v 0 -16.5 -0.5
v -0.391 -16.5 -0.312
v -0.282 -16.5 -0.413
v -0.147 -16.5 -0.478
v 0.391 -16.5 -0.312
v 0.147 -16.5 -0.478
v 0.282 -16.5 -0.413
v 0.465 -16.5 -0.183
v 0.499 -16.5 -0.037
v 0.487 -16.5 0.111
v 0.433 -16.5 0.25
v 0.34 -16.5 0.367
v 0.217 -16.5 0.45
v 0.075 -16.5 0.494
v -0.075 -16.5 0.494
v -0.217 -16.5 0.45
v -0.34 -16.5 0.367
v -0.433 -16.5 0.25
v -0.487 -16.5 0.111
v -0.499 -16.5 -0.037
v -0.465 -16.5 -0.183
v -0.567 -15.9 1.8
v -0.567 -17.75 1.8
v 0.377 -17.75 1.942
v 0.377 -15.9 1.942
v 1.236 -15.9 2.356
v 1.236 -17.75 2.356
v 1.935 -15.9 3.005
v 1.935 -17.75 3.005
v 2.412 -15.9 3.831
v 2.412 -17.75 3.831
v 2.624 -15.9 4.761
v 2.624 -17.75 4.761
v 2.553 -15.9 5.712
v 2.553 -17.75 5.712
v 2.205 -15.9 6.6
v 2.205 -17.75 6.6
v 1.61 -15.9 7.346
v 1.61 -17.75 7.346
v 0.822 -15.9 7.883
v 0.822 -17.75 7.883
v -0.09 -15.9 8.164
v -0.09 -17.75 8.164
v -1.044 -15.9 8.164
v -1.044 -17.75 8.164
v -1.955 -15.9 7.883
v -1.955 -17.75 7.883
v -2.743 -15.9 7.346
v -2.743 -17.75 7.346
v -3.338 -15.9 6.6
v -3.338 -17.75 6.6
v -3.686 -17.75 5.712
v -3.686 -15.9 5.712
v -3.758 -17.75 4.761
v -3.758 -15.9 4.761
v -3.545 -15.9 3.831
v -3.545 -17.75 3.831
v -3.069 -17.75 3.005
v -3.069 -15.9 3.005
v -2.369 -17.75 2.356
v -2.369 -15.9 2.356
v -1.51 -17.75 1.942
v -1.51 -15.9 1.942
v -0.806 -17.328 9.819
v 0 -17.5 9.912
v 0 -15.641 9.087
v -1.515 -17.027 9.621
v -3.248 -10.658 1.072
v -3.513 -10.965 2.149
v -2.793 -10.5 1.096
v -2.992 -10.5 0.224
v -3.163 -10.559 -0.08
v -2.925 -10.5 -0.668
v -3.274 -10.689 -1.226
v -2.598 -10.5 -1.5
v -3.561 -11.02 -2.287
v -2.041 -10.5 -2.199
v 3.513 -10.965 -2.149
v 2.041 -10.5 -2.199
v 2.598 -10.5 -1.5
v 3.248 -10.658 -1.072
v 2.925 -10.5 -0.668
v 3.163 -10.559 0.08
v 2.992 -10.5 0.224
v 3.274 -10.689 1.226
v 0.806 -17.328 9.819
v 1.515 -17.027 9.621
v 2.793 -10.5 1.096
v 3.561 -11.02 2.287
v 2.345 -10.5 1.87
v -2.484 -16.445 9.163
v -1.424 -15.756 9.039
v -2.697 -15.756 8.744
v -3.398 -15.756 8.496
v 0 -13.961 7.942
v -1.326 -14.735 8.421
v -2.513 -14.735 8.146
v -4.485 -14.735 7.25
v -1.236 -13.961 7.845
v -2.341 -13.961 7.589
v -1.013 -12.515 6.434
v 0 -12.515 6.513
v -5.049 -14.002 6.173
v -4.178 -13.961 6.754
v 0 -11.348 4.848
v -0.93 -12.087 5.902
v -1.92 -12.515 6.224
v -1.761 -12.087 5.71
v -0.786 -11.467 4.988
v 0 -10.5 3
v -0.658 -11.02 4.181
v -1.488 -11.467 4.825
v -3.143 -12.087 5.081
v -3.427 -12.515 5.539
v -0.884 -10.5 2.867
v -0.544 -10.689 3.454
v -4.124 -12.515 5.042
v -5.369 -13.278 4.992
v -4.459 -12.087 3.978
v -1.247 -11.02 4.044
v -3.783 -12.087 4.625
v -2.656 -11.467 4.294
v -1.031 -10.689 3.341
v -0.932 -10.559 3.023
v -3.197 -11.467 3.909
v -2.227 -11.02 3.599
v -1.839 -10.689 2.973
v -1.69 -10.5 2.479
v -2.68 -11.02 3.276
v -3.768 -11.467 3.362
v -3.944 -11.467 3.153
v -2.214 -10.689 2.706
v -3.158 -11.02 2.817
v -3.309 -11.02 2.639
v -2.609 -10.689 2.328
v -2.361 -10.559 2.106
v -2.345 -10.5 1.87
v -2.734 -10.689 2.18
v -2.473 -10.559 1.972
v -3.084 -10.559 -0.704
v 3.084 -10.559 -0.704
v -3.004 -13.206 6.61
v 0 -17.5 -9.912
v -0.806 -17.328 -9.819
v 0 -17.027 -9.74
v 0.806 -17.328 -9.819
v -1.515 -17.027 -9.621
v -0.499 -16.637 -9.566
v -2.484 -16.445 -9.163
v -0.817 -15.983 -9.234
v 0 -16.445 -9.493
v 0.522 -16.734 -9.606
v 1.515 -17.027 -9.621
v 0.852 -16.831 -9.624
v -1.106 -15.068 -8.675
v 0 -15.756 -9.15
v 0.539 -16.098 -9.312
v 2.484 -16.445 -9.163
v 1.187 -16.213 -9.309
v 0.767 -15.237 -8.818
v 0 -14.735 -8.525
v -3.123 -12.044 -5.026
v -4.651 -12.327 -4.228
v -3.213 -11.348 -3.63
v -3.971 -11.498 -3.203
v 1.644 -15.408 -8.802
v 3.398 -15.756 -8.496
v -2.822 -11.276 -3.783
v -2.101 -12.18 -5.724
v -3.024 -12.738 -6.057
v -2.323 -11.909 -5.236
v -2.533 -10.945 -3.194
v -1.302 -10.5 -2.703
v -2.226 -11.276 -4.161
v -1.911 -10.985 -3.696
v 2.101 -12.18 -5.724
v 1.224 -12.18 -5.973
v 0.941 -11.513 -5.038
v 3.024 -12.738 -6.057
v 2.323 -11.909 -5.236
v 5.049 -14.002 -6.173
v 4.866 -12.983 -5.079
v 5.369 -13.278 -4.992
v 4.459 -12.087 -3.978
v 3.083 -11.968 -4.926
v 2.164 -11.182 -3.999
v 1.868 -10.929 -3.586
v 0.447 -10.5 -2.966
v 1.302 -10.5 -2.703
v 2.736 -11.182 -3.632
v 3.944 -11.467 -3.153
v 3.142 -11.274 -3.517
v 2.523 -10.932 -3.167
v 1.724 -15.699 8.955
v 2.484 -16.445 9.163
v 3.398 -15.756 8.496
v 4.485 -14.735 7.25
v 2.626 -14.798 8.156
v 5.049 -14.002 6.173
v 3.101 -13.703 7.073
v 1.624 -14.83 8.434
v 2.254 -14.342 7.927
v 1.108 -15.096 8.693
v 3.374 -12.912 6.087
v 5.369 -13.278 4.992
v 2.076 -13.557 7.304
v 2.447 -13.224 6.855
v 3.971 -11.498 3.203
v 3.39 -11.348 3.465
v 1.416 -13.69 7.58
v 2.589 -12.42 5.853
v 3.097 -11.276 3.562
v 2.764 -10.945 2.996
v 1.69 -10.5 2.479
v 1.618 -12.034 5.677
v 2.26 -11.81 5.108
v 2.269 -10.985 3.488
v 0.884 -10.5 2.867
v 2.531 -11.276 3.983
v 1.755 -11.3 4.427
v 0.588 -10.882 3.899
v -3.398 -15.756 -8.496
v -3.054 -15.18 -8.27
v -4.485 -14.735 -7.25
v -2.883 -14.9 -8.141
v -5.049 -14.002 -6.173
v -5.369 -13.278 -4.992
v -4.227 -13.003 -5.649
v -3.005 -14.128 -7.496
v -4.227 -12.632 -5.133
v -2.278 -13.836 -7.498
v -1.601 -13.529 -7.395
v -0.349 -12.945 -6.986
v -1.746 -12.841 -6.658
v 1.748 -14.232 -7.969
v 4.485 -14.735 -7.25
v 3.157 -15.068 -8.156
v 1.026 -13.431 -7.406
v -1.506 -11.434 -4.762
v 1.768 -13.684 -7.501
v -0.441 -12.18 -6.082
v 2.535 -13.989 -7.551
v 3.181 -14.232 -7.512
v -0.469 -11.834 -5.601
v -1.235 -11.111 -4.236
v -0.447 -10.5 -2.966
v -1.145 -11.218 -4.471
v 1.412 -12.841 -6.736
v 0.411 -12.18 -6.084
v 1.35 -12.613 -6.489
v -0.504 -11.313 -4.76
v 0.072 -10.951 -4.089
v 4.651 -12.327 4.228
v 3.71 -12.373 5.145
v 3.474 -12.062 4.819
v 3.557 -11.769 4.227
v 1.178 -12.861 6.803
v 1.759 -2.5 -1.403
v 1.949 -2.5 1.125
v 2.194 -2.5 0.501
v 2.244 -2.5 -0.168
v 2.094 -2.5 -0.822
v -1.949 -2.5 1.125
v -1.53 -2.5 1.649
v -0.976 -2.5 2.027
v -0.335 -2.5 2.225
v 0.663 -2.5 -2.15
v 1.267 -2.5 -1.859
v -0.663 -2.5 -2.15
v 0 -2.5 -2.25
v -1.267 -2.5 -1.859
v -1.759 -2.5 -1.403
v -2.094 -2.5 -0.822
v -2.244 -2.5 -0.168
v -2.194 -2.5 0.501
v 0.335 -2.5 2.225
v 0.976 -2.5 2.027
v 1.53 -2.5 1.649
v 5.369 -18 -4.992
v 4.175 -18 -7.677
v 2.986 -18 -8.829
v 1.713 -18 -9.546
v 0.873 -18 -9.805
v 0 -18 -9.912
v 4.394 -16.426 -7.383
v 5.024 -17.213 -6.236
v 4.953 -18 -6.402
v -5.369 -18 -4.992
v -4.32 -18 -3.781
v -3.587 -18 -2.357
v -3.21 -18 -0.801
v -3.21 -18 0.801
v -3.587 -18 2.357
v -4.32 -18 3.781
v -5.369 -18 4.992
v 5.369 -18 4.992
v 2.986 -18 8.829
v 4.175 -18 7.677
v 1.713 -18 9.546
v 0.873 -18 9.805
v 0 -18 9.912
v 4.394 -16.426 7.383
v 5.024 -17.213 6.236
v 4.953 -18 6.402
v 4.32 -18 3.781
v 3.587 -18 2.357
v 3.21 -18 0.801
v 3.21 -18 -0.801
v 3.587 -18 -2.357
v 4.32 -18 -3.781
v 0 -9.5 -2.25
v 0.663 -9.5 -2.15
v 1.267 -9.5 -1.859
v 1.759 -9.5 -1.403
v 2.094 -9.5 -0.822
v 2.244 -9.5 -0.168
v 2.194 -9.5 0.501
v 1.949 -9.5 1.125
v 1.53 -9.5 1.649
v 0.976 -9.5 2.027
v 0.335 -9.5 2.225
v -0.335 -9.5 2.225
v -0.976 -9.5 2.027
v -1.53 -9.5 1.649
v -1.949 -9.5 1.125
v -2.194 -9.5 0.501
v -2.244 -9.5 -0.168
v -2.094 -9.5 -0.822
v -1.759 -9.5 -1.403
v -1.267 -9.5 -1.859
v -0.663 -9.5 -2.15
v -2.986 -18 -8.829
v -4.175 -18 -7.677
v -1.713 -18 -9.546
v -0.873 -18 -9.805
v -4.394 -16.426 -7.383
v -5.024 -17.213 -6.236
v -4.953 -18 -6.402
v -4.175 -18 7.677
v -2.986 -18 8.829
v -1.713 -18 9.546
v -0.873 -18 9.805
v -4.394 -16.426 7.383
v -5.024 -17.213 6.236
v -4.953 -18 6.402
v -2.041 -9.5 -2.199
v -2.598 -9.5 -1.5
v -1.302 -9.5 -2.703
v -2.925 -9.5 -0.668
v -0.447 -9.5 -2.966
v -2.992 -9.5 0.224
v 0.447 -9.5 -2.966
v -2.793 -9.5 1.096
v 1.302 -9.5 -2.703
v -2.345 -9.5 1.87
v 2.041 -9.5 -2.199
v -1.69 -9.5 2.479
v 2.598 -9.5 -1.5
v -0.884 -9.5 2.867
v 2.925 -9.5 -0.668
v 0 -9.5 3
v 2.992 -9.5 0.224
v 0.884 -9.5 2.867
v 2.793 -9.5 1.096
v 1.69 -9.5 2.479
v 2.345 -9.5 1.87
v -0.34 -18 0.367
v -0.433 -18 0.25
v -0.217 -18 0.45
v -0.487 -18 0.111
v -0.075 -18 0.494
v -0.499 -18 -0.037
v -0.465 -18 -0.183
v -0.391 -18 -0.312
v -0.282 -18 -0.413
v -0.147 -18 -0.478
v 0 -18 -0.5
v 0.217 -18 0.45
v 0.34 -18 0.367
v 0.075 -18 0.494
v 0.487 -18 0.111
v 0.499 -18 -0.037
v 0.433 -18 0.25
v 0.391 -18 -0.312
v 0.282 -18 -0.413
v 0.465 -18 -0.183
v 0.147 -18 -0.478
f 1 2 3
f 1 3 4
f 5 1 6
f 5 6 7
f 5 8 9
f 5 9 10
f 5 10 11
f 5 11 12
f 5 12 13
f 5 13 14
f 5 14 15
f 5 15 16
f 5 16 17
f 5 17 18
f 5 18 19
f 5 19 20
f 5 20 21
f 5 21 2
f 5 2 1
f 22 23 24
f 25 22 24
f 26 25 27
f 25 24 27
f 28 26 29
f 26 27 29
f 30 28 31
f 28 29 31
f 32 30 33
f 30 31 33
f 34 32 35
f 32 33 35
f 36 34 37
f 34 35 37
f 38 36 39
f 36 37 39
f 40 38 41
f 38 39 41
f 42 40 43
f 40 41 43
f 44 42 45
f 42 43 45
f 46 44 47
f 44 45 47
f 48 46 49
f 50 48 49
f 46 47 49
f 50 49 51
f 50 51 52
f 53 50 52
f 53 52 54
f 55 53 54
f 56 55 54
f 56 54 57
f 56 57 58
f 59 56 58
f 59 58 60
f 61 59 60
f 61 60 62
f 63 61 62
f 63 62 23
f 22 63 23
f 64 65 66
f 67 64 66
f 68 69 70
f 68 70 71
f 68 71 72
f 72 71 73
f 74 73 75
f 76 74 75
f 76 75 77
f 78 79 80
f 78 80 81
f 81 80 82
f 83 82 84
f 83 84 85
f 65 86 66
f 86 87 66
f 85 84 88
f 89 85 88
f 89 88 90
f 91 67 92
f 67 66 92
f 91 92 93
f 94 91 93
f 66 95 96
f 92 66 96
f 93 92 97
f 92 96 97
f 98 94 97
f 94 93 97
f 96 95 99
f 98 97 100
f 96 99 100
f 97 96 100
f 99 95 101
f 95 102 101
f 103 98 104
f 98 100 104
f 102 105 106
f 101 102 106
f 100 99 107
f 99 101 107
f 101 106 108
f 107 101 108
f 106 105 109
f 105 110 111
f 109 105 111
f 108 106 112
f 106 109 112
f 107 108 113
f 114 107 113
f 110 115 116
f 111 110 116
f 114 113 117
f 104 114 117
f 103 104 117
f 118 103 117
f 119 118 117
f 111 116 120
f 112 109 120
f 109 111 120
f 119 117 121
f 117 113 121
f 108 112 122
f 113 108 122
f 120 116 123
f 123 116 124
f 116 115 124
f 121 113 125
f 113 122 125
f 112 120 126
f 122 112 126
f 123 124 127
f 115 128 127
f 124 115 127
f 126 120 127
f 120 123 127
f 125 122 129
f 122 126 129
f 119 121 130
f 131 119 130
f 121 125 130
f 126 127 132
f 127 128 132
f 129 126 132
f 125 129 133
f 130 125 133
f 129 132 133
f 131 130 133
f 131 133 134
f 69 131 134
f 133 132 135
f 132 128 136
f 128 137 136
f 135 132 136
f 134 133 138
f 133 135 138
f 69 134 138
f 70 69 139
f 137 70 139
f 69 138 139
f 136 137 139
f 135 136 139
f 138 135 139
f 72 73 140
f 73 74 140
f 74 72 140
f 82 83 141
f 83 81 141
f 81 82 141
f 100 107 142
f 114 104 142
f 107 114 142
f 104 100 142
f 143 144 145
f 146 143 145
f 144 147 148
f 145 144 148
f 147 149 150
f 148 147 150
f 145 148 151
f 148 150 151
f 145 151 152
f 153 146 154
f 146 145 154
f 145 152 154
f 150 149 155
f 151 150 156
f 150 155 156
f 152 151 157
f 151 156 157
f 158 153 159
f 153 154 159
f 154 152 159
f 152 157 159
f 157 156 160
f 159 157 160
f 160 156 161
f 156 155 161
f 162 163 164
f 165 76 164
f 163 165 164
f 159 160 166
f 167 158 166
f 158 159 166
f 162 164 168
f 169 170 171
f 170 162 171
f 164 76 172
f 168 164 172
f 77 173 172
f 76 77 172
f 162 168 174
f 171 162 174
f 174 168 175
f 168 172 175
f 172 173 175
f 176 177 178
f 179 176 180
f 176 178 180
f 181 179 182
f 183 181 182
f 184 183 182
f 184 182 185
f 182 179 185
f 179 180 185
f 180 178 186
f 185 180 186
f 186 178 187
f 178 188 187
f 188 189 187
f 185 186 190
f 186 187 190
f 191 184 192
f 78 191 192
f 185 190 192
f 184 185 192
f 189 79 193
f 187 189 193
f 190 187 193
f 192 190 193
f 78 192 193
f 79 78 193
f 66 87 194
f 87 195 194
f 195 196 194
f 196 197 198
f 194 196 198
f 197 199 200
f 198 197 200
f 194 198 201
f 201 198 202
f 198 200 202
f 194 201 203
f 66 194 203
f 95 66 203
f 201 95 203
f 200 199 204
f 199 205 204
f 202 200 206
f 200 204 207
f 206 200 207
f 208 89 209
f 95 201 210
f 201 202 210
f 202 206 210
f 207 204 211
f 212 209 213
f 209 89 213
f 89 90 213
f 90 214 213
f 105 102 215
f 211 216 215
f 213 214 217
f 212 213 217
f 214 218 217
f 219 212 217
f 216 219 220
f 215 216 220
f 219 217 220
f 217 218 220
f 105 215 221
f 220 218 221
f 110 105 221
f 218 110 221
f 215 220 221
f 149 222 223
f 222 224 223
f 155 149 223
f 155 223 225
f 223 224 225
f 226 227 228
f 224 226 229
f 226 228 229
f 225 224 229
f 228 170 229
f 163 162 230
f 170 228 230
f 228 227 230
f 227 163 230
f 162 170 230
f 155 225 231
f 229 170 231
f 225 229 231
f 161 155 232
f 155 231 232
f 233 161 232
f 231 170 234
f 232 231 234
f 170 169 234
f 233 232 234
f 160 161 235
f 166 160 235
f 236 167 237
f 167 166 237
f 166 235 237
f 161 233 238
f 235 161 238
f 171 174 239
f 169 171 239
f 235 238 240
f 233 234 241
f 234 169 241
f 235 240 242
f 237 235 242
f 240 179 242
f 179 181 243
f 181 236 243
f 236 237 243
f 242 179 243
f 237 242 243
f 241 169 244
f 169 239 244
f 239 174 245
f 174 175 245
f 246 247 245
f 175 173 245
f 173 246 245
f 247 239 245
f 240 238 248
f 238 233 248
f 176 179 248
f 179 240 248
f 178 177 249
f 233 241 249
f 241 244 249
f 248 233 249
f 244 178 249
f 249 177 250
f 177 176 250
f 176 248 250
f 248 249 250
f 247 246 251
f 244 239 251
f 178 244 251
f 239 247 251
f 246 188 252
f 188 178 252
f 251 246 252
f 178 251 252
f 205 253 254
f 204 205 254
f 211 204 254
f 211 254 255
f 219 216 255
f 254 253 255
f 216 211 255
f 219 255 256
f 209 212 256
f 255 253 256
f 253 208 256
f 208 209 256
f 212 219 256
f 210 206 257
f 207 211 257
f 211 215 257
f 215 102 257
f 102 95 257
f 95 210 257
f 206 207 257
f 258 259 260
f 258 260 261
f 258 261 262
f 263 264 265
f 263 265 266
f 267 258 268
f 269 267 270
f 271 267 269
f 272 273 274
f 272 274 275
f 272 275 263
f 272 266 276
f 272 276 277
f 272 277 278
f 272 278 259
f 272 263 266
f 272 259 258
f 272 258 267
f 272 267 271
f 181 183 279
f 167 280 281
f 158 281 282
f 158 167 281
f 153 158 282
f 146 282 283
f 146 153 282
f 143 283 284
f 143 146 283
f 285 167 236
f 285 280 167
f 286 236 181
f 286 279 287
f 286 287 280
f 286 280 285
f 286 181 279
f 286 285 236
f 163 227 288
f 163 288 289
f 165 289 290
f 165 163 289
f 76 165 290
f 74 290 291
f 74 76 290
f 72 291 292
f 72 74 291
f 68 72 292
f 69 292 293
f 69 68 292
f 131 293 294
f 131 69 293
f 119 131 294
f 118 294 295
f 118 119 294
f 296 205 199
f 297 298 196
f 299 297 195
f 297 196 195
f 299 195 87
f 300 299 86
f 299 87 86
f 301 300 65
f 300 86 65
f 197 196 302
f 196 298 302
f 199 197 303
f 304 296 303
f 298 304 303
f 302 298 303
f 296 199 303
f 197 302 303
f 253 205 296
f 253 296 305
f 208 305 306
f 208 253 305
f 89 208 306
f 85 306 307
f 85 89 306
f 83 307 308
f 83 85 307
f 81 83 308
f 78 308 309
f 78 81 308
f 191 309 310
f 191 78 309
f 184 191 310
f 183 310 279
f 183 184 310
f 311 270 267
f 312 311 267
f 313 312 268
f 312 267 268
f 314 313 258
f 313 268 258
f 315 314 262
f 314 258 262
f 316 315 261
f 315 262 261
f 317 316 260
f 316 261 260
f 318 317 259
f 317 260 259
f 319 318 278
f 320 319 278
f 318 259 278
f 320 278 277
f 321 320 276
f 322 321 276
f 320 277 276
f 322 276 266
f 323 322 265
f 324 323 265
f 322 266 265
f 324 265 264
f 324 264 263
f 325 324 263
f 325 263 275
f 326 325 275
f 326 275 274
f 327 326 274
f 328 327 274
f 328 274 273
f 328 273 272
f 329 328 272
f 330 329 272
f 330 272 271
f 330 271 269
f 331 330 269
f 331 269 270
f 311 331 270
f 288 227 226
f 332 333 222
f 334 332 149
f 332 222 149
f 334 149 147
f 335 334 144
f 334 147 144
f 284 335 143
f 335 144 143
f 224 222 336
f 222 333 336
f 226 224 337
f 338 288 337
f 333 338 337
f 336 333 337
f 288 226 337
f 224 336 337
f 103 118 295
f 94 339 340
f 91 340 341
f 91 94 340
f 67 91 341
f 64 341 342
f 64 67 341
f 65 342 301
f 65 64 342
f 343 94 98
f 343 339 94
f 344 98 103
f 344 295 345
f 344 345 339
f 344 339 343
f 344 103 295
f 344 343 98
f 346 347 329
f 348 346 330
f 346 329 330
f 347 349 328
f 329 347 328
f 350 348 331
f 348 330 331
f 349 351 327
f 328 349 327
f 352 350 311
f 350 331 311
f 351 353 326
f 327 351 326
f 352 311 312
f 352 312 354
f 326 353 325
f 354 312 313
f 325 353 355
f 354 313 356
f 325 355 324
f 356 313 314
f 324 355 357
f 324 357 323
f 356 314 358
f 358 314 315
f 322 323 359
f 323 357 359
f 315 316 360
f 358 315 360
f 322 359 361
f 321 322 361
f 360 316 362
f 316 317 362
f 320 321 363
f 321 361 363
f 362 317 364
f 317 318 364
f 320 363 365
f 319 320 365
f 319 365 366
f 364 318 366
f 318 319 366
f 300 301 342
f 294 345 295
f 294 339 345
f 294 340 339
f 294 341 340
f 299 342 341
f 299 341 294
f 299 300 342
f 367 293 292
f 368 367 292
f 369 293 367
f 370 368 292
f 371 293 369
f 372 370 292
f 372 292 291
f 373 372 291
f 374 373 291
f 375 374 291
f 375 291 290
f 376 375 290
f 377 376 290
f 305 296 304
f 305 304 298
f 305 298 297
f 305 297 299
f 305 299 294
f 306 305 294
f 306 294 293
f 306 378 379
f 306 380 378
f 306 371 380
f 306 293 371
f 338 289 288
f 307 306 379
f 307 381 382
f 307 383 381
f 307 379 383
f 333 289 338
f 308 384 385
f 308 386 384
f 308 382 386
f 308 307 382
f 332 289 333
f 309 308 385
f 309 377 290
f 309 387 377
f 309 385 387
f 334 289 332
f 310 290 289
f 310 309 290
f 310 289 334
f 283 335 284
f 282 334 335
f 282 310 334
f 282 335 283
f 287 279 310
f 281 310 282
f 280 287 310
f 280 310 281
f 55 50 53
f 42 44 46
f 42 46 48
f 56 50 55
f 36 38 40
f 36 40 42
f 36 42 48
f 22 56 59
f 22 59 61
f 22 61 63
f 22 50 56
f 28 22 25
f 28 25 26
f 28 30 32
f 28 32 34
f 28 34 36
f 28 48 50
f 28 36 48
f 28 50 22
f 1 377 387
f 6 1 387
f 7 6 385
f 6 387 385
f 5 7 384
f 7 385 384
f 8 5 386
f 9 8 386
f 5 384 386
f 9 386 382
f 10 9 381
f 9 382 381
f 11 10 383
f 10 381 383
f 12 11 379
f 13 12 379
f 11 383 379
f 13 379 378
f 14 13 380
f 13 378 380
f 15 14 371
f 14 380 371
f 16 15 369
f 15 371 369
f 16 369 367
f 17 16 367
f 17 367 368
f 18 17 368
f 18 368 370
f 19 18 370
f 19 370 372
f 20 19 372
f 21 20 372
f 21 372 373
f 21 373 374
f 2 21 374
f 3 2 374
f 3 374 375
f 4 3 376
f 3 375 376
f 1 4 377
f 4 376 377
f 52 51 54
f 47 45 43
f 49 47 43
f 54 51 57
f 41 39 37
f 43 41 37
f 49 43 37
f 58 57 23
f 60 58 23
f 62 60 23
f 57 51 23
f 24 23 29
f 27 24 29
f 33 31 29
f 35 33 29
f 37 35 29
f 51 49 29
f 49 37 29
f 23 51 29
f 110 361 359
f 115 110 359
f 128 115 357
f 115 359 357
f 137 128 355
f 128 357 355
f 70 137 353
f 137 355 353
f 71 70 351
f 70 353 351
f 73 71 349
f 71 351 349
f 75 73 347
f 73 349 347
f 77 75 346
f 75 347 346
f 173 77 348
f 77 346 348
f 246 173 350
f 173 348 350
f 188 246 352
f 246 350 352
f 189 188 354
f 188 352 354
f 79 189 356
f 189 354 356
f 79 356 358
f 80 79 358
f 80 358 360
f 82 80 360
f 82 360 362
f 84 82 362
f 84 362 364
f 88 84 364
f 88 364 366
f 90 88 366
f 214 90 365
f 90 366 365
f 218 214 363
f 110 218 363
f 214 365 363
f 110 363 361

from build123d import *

# Parameters (mm, degrees)
SKETCH1_R           = 5
SKETCH1_R_2         = 3
BOSS_EXTRUDE2_DEPTH = 17.5
SKETCH4_W           = 18
SKETCH4_H           = 1
EXTRUDE_THIN1_DEPTH = 35
CIRPATTERN1_COUNT   = 9
SKETCH5_R           = 3
BOSS_EXTRUDE3_DEPTH = 15
SKETCH6_R           = 3.5
SKETCH6_R_2         = 1.5
CUT_EXTRUDE1_DEPTH  = 6
SKETCH15_R          = 1.5
CUT_EXTRUDE2_DEPTH  = 2
SKETCH17_R          = 2.5
BOSS_EXTRUDE4_DEPTH = 3
SKETCH18_R          = 2
CUT_EXTRUDE3_DEPTH  = 2
SKETCH19_R          = 4
CUT_EXTRUDE4_DEPTH  = 20
SKETCH20_W          = 45.677284088
SKETCH20_H          = 45.724664858
CUT_EXTRUDE5_DEPTH  = 8
SKETCH21_R          = 3
BOSS_EXTRUDE5_DEPTH = 1
SKETCH24_R          = 9.912143672
BOSS_EXTRUDE6_DEPTH = 0.5
SKETCH25_R          = 3.2
CUT_EXTRUDE6_DEPTH  = 2.1
SKETCH26_R          = 3.2
BOSS_EXTRUDE7_DEPTH = 0.25
CUT_EXTRUDE8_START  = -7.5
CUT_EXTRUDE8_DEPTH  = 7.5
SKETCH28_R          = 0.5
CUT_EXTRUDE9_DEPTH  = 1.5
CUT_EXTRUDE10_DEPTH = 7
BOSS_EXTRUDE8_START = 10
SKETCH30_R          = 4
BOSS_EXTRUDE8_DEPTH = 10
CUT_EXTRUDE12_START = -20
SKETCH31_R          = 2.25
CUT_EXTRUDE12_DEPTH = 20
SKETCH32_R          = 2.25
CUT_EXTRUDE13_DEPTH = 10


with BuildPart() as part:
    # Sketch1 → Boss-Extrude2 (new, symmetric)
    with BuildSketch(Plane(origin=(0, 0, 0), x_dir=(1, 0, 0), z_dir=(0, 1, 0))):
        with Locations(Location((0, 0, 0), (0, 0, 270))):
            Circle(SKETCH1_R)
        with Locations(Location((0, 0, 0), (0, 0, 270))):
            Circle(SKETCH1_R_2, mode=Mode.SUBTRACT)
    extrude(amount=BOSS_EXTRUDE2_DEPTH, both=True)

    # Sketch4 → Extrude-Thin1 (add)
    with BuildSketch(Plane(origin=(0, 17.5, 0), x_dir=(1, 0, 0), z_dir=(0, 1, 0))):
        with Locations((12, 0)):
            Rectangle(SKETCH4_W, SKETCH4_H)
    extrude_thin1 = extrude(amount=-EXTRUDE_THIN1_DEPTH)

    # CirPattern1: Extrude-Thin1 ×9 about axis
    cirpattern1_axis = Axis((0, 0, 0), (0, 1, 0))
    for i in range(1, CIRPATTERN1_COUNT):
        add(extrude_thin1.rotate(cirpattern1_axis, i * 360 / CIRPATTERN1_COUNT))

    # Sketch5 → Boss-Extrude3 (add)
    with BuildSketch(Plane(origin=(0, -17.5, 0), x_dir=(-1, 0, 0), z_dir=(0, -1, 0))):
        with Locations(Location((0, 0, 0), (0, 0, 90))):
            Circle(SKETCH5_R)
    extrude(amount=-BOSS_EXTRUDE3_DEPTH)

    # Sketch6 → Cut-Extrude1 (cut)
    with BuildSketch(Plane(origin=(0, -17.5, 0), x_dir=(-1, 0, 0), z_dir=(0, -1, 0))):
        with Locations(Location((0, 0, 0), (0, 0, 90))):
            Circle(SKETCH6_R)
        with Locations(Location((0, 0, 0), (0, 0, 90))):
            Circle(SKETCH6_R_2, mode=Mode.SUBTRACT)
    extrude(amount=-CUT_EXTRUDE1_DEPTH, mode=Mode.SUBTRACT)

    # Sketch15 → Cut-Extrude2 (cut)
    with BuildSketch(Plane.XZ.offset(17.5)):
        with Locations(Location((0, 0, 0), (0, 0, 270))):
            Circle(SKETCH15_R)
    extrude(amount=-CUT_EXTRUDE2_DEPTH, mode=Mode.SUBTRACT)

    # Sketch17 → Boss-Extrude4 (add)
    with BuildSketch(Plane.XZ.offset(17.5)):
        with Locations((18.5, 0)):
            Circle(SKETCH17_R)
    extrude(amount=-BOSS_EXTRUDE4_DEPTH)

    # Sketch18 → Cut-Extrude3 (cut)
    with BuildSketch(Plane.XZ.offset(17.5)):
        with Locations(Location((18.5, 0, 0), (0, 0, 270))):
            Circle(SKETCH18_R)
    extrude(amount=-CUT_EXTRUDE3_DEPTH, mode=Mode.SUBTRACT)

    # Sketch19 → Cut-Extrude4 (cut)
    with BuildSketch(Plane(origin=(0, 17.5, 0), x_dir=(1, 0, 0), z_dir=(0, 1, 0))):
        with Locations(Location((0, 0, 0), (0, 0, 270))):
            Circle(SKETCH19_R)
    extrude(amount=-CUT_EXTRUDE4_DEPTH, mode=Mode.SUBTRACT)

    # Sketch20 → Cut-Extrude5 (cut)
    with BuildSketch(Plane(origin=(0, -17.5, 0), x_dir=(-1, 0, 0), z_dir=(0, -1, 0))):
        Rectangle(SKETCH20_W, SKETCH20_H)
    extrude(amount=-CUT_EXTRUDE5_DEPTH, mode=Mode.SUBTRACT)

    # Sketch21 → Boss-Extrude5 (add)
    with BuildSketch(Plane.XZ.offset(9.5)):
        with Locations(Location((0, 0, 0), (0, 0, 90))):
            Circle(SKETCH21_R)
    extrude(amount=BOSS_EXTRUDE5_DEPTH)

    # Sketch23 → Revolve1 (revolve)
    with BuildSketch(Plane(origin=(0, 0, 0), x_dir=(0, 0, -1), z_dir=(1, 0, 0))):
        with BuildLine():
            Line((-3, -10.5), (-2, -10.5))
            Line((-2, -10.5), (0, -10.5))
            Line((0, -10.5), (0, -17.5))
            Line((0, -17.5), (-8.912143672, -17.5))
            Line((-8.912143672, -17.5), (-9.912143672, -17.5))
            ThreePointArc((-9.912143672, -17.5), (-7.260403323, -13.2057636), (-3, -10.5))
        make_face()
    revolve(axis=Axis((0, -11.130650603, 0), (0, -1, 0)))

    # Sketch24 → Boss-Extrude6 (add)
    with BuildSketch(Plane.XZ.offset(17.5)):
        with Locations(Location((0, 0, 0), (0, 0, 270))):
            Circle(SKETCH24_R)
    extrude(amount=BOSS_EXTRUDE6_DEPTH)

    # Sketch25 → Cut-Extrude6 (cut)
    with BuildSketch(Plane.XZ.offset(18)):
        with Locations(Location((-0.56668442, 5, 0), (0, 0, 270))):
            Circle(SKETCH25_R)
    extrude(amount=-CUT_EXTRUDE6_DEPTH, mode=Mode.SUBTRACT)

    # Sketch26 → Boss-Extrude7 (add)
    with BuildSketch(Plane.XZ.offset(18)):
        with Locations(Location((-0.56668442, 5, 0), (0, 0, 270))):
            Circle(SKETCH26_R)
    extrude(amount=-BOSS_EXTRUDE7_DEPTH)

    # Sketch27 → Cut-Extrude8 (cut)
    with BuildSketch(Plane.XZ.offset(18).offset(CUT_EXTRUDE8_START)):
        with BuildLine():
            ThreePointArc((-5.368630905, 4.991892601), (-6.424807204, 5.779358473), (-7.613826501, 6.346671425))
            ThreePointArc((-7.613826501, 6.346671425), (-9.912143672, 0), (-7.613826501, -6.346671425))
            ThreePointArc((-7.613826501, -6.346671425), (-6.424807204, -5.779358473), (-5.368630905, -4.991892601))
            ThreePointArc((-5.368630905, -4.991892601), (-3.162143672, 0), (-5.368630905, 4.991892601))
        make_face()
        with BuildLine():
            ThreePointArc((9.912143672, 0), (9.319869483, 3.375), (7.613826501, 6.346671425))
            ThreePointArc((7.613826501, 6.346671425), (6.424807204, 5.779358473), (5.368630905, 4.991892601))
            ThreePointArc((5.368630905, 4.991892601), (3.162143672, 0), (5.368630905, -4.991892601))
            ThreePointArc((5.368630905, -4.991892601), (6.424807204, -5.779358473), (7.613826501, -6.346671425))
            ThreePointArc((7.613826501, -6.346671425), (9.319869483, -3.375), (9.912143672, 0))
        make_face()
        with BuildLine():
            ThreePointArc((-5.368630905, -4.991892601), (-6.424807204, -5.779358473), (-7.613826501, -6.346671425))
            ThreePointArc((-7.613826501, -6.346671425), (-4.203657524, -8.976628297), (0, -9.912143672))
            add(Edge.make_bspline(
                [(-5.368630905, -4.991892601), (-4.998119196, -7.539682857), (-2.616364035, -9.837937814), (0, -9.912143672)],
                knots=[0, 0, 0, 0, 1, 1, 1, 1], degree=3))
        make_face()
        with BuildLine():
            add(Edge.make_bspline(
                [(5.368630905, -4.991892601), (4.998119196, -7.539682857), (2.616364035, -9.837937814), (0, -9.912143672)],
                knots=[0, 0, 0, 0, 1, 1, 1, 1], degree=3))
            ThreePointArc((0, -9.912143672), (4.203657524, -8.976628297), (7.613826501, -6.346671425))
            ThreePointArc((7.613826501, -6.346671425), (6.424807204, -5.779358473), (5.368630905, -4.991892601))
        make_face()
        with BuildLine():
            ThreePointArc((0, 9.912143672), (-4.203657524, 8.976628297), (-7.613826501, 6.346671425))
            ThreePointArc((-7.613826501, 6.346671425), (-6.424807204, 5.779358473), (-5.368630905, 4.991892601))
            add(Edge.make_bspline(
                [(-5.368630905, 4.991892601), (-4.998119196, 7.539682857), (-2.616364035, 9.837937814), (0, 9.912143672)],
                knots=[0, 0, 0, 0, 1, 1, 1, 1], degree=3))
        make_face()
        with BuildLine():
            ThreePointArc((7.613826501, 6.346671425), (4.203657524, 8.976628297), (0, 9.912143672))
            add(Edge.make_bspline(
                [(5.368630905, 4.991892601), (4.998119196, 7.539682857), (2.616364035, 9.837937814), (0, 9.912143672)],
                knots=[0, 0, 0, 0, 1, 1, 1, 1], degree=3))
            ThreePointArc((5.368630905, 4.991892601), (6.424807204, 5.779358473), (7.613826501, 6.346671425))
        make_face()
    extrude(amount=CUT_EXTRUDE8_DEPTH, mode=Mode.SUBTRACT)

    # Sketch28 → Cut-Extrude9 (cut)
    with BuildSketch(Plane.XZ.offset(18)):
        with Locations(Location((0, 0, 0), (0, 0, 270))):
            Circle(SKETCH28_R)
    extrude(amount=-CUT_EXTRUDE9_DEPTH, mode=Mode.SUBTRACT)

    # Sketch29 → Cut-Extrude10 (cut)
    with BuildSketch(Plane(origin=(0, 17.5, 0), x_dir=(1, 0, 0), z_dir=(0, 1, 0))):
        with BuildLine():
            Line((3.489629181, -3.580850203), (15.765539501, -13.881562025))
            Line((15.765539501, -13.881562025), (16.40832711, -13.115517582))
            Line((16.40832711, -13.115517582), (4.132416791, -2.81480576))
            ThreePointArc((4.132416791, -2.81480576), (4.698463104, -1.710100717), (4.974937186, -0.5))
            Line((4.974937186, -0.5), (21, -0.5))
            Line((21, -0.5), (21, 0.5))
            Line((21, 0.5), (4.974937186, 0.5))
            ThreePointArc((4.974937186, 0.5), (4.698463104, 1.710100717), (4.132416791, 2.81480576))
            Line((4.132416791, 2.81480576), (16.40832711, 13.115517582))
            Line((16.40832711, 13.115517582), (15.765539501, 13.881562025))
            Line((15.765539501, 13.881562025), (3.489629181, 3.580850203))
            ThreePointArc((3.489629181, 3.580850203), (2.5, 4.330127019), (1.356292653, 4.812532622))
            Line((1.356292653, 4.812532622), (4.139015608, 20.594138724))
            Line((4.139015608, 20.594138724), (3.154207854, 20.767786902))
            Line((3.154207854, 20.767786902), (0.3714849, 4.9861808))
            ThreePointArc((0.3714849, 4.9861808), (-0.868240888, 4.924038765), (-2.054455891, 4.558421985))
            Line((-2.054455891, 4.558421985), (-10.066987298, 18.436533479))
            Line((-10.066987298, 18.436533479), (-10.933012702, 17.936533479))
            Line((-10.933012702, 17.936533479), (-2.920481295, 4.058421985))
            ThreePointArc((-2.920481295, 4.058421985), (-3.830222216, 3.213938048), (-4.50390169, 2.17137504))
            Line((-4.50390169, 2.17137504), (-19.562534965, 7.65226932))
            Line((-19.562534965, 7.65226932), (-19.904555108, 6.712576699))
            Line((-19.904555108, 6.712576699), (-4.845921834, 1.231682419))
            ThreePointArc((-4.845921834, 1.231682419), (-5, 0), (-4.845921834, -1.231682419))
            Line((-4.845921834, -1.231682419), (-19.904555108, -6.712576699))
            Line((-19.904555108, -6.712576699), (-19.562534965, -7.65226932))
            Line((-19.562534965, -7.65226932), (-4.50390169, -2.17137504))
            ThreePointArc((-4.50390169, -2.17137504), (-3.830222216, -3.213938048), (-2.920481295, -4.058421985))
            Line((-2.920481295, -4.058421985), (-10.933012702, -17.936533479))
            Line((-10.933012702, -17.936533479), (-10.066987298, -18.436533479))
            Line((-10.066987298, -18.436533479), (-2.054455891, -4.558421985))
            ThreePointArc((-2.054455891, -4.558421985), (-0.868240888, -4.924038765), (0.3714849, -4.9861808))
            Line((0.3714849, -4.9861808), (3.154207854, -20.767786902))
            Line((3.154207854, -20.767786902), (4.139015608, -20.594138724))
            Line((4.139015608, -20.594138724), (1.356292653, -4.812532622))
            ThreePointArc((1.356292653, -4.812532622), (2.5, -4.330127019), (3.489629181, -3.580850203))
        make_face()
    extrude(amount=-CUT_EXTRUDE10_DEPTH, mode=Mode.SUBTRACT)

    # Sketch30 → Boss-Extrude8 (add)
    with BuildSketch(Plane(origin=(0, -2.5, 0), x_dir=(1, 0, 0), z_dir=(0, 1, 0)).offset(BOSS_EXTRUDE8_START)):
        with Locations(Location((0, 0, 0), (0, 0, 270))):
            Circle(SKETCH30_R)
    extrude(amount=-BOSS_EXTRUDE8_DEPTH)

    # Sketch31 → Cut-Extrude12 (cut)
    with BuildSketch(Plane.XZ.offset(9.5).offset(CUT_EXTRUDE12_START)):
        with BuildLine():
            Line((-2.054455891, 4.558421985), (-10.066987298, 18.436533479))
            Line((-10.066987298, 18.436533479), (-10.933012702, 17.936533479))
            Line((-10.933012702, 17.936533479), (-2.920481295, 4.058421985))
            ThreePointArc((-2.920481295, 4.058421985), (-3.830222216, 3.213938048), (-4.50390169, 2.17137504))
            Line((-4.50390169, 2.17137504), (-19.562534965, 7.65226932))
            Line((-19.562534965, 7.65226932), (-19.904555108, 6.712576699))
            Line((-19.904555108, 6.712576699), (-4.845921834, 1.231682419))
            ThreePointArc((-4.845921834, 1.231682419), (-5, 0), (-4.845921834, -1.231682419))
            Line((-4.845921834, -1.231682419), (-19.904555108, -6.712576699))
            Line((-19.904555108, -6.712576699), (-19.562534965, -7.65226932))
            Line((-19.562534965, -7.65226932), (-4.50390169, -2.17137504))
            ThreePointArc((-4.50390169, -2.17137504), (-3.830222216, -3.213938048), (-2.920481295, -4.058421985))
            Line((-2.920481295, -4.058421985), (-10.933012702, -17.936533479))
            Line((-10.933012702, -17.936533479), (-10.066987298, -18.436533479))
            Line((-10.066987298, -18.436533479), (-2.054455891, -4.558421985))
            ThreePointArc((-2.054455891, -4.558421985), (-0.868240888, -4.924038765), (0.3714849, -4.9861808))
            Line((0.3714849, -4.9861808), (3.154207854, -20.767786902))
            Line((3.154207854, -20.767786902), (4.139015608, -20.594138724))
            Line((4.139015608, -20.594138724), (1.356292653, -4.812532622))
            ThreePointArc((1.356292653, -4.812532622), (2.5, -4.330127019), (3.489629181, -3.580850203))
            Line((3.489629181, -3.580850203), (15.765539501, -13.881562025))
            Line((15.765539501, -13.881562025), (16.40832711, -13.115517582))
            Line((16.40832711, -13.115517582), (4.132416791, -2.81480576))
            ThreePointArc((4.132416791, -2.81480576), (4.698463104, -1.710100717), (4.974937186, -0.5))
            Line((4.974937186, -0.5), (21, -0.5))
            Line((21, -0.5), (21, 0.5))
            Line((21, 0.5), (4.974937186, 0.5))
            ThreePointArc((4.974937186, 0.5), (4.698463104, 1.710100717), (4.132416791, 2.81480576))
            Line((4.132416791, 2.81480576), (16.40832711, 13.115517582))
            Line((16.40832711, 13.115517582), (15.765539501, 13.881562025))
            Line((15.765539501, 13.881562025), (3.489629181, 3.580850203))
            ThreePointArc((3.489629181, 3.580850203), (2.5, 4.330127019), (1.356292653, 4.812532622))
            Line((1.356292653, 4.812532622), (4.139015608, 20.594138724))
            Line((4.139015608, 20.594138724), (3.154207854, 20.767786902))
            Line((3.154207854, 20.767786902), (0.3714849, 4.9861808))
            ThreePointArc((0.3714849, 4.9861808), (-0.868240888, 4.924038765), (-2.054455891, 4.558421985))
        make_face()
        with Locations(Location((0, 0, 0), (0, 0, 270))):
            Circle(SKETCH31_R, mode=Mode.SUBTRACT)
    extrude(amount=CUT_EXTRUDE12_DEPTH, mode=Mode.SUBTRACT)

    # Sketch32 → Cut-Extrude13 (cut)
    with BuildSketch(Plane(origin=(0, 7.5, 0), x_dir=(1, 0, 0), z_dir=(0, 1, 0))):
        with Locations(Location((0, 0, 0), (0, 0, 90))):
            Circle(SKETCH32_R)
    extrude(amount=-CUT_EXTRUDE13_DEPTH, mode=Mode.SUBTRACT)


solid = part.part
